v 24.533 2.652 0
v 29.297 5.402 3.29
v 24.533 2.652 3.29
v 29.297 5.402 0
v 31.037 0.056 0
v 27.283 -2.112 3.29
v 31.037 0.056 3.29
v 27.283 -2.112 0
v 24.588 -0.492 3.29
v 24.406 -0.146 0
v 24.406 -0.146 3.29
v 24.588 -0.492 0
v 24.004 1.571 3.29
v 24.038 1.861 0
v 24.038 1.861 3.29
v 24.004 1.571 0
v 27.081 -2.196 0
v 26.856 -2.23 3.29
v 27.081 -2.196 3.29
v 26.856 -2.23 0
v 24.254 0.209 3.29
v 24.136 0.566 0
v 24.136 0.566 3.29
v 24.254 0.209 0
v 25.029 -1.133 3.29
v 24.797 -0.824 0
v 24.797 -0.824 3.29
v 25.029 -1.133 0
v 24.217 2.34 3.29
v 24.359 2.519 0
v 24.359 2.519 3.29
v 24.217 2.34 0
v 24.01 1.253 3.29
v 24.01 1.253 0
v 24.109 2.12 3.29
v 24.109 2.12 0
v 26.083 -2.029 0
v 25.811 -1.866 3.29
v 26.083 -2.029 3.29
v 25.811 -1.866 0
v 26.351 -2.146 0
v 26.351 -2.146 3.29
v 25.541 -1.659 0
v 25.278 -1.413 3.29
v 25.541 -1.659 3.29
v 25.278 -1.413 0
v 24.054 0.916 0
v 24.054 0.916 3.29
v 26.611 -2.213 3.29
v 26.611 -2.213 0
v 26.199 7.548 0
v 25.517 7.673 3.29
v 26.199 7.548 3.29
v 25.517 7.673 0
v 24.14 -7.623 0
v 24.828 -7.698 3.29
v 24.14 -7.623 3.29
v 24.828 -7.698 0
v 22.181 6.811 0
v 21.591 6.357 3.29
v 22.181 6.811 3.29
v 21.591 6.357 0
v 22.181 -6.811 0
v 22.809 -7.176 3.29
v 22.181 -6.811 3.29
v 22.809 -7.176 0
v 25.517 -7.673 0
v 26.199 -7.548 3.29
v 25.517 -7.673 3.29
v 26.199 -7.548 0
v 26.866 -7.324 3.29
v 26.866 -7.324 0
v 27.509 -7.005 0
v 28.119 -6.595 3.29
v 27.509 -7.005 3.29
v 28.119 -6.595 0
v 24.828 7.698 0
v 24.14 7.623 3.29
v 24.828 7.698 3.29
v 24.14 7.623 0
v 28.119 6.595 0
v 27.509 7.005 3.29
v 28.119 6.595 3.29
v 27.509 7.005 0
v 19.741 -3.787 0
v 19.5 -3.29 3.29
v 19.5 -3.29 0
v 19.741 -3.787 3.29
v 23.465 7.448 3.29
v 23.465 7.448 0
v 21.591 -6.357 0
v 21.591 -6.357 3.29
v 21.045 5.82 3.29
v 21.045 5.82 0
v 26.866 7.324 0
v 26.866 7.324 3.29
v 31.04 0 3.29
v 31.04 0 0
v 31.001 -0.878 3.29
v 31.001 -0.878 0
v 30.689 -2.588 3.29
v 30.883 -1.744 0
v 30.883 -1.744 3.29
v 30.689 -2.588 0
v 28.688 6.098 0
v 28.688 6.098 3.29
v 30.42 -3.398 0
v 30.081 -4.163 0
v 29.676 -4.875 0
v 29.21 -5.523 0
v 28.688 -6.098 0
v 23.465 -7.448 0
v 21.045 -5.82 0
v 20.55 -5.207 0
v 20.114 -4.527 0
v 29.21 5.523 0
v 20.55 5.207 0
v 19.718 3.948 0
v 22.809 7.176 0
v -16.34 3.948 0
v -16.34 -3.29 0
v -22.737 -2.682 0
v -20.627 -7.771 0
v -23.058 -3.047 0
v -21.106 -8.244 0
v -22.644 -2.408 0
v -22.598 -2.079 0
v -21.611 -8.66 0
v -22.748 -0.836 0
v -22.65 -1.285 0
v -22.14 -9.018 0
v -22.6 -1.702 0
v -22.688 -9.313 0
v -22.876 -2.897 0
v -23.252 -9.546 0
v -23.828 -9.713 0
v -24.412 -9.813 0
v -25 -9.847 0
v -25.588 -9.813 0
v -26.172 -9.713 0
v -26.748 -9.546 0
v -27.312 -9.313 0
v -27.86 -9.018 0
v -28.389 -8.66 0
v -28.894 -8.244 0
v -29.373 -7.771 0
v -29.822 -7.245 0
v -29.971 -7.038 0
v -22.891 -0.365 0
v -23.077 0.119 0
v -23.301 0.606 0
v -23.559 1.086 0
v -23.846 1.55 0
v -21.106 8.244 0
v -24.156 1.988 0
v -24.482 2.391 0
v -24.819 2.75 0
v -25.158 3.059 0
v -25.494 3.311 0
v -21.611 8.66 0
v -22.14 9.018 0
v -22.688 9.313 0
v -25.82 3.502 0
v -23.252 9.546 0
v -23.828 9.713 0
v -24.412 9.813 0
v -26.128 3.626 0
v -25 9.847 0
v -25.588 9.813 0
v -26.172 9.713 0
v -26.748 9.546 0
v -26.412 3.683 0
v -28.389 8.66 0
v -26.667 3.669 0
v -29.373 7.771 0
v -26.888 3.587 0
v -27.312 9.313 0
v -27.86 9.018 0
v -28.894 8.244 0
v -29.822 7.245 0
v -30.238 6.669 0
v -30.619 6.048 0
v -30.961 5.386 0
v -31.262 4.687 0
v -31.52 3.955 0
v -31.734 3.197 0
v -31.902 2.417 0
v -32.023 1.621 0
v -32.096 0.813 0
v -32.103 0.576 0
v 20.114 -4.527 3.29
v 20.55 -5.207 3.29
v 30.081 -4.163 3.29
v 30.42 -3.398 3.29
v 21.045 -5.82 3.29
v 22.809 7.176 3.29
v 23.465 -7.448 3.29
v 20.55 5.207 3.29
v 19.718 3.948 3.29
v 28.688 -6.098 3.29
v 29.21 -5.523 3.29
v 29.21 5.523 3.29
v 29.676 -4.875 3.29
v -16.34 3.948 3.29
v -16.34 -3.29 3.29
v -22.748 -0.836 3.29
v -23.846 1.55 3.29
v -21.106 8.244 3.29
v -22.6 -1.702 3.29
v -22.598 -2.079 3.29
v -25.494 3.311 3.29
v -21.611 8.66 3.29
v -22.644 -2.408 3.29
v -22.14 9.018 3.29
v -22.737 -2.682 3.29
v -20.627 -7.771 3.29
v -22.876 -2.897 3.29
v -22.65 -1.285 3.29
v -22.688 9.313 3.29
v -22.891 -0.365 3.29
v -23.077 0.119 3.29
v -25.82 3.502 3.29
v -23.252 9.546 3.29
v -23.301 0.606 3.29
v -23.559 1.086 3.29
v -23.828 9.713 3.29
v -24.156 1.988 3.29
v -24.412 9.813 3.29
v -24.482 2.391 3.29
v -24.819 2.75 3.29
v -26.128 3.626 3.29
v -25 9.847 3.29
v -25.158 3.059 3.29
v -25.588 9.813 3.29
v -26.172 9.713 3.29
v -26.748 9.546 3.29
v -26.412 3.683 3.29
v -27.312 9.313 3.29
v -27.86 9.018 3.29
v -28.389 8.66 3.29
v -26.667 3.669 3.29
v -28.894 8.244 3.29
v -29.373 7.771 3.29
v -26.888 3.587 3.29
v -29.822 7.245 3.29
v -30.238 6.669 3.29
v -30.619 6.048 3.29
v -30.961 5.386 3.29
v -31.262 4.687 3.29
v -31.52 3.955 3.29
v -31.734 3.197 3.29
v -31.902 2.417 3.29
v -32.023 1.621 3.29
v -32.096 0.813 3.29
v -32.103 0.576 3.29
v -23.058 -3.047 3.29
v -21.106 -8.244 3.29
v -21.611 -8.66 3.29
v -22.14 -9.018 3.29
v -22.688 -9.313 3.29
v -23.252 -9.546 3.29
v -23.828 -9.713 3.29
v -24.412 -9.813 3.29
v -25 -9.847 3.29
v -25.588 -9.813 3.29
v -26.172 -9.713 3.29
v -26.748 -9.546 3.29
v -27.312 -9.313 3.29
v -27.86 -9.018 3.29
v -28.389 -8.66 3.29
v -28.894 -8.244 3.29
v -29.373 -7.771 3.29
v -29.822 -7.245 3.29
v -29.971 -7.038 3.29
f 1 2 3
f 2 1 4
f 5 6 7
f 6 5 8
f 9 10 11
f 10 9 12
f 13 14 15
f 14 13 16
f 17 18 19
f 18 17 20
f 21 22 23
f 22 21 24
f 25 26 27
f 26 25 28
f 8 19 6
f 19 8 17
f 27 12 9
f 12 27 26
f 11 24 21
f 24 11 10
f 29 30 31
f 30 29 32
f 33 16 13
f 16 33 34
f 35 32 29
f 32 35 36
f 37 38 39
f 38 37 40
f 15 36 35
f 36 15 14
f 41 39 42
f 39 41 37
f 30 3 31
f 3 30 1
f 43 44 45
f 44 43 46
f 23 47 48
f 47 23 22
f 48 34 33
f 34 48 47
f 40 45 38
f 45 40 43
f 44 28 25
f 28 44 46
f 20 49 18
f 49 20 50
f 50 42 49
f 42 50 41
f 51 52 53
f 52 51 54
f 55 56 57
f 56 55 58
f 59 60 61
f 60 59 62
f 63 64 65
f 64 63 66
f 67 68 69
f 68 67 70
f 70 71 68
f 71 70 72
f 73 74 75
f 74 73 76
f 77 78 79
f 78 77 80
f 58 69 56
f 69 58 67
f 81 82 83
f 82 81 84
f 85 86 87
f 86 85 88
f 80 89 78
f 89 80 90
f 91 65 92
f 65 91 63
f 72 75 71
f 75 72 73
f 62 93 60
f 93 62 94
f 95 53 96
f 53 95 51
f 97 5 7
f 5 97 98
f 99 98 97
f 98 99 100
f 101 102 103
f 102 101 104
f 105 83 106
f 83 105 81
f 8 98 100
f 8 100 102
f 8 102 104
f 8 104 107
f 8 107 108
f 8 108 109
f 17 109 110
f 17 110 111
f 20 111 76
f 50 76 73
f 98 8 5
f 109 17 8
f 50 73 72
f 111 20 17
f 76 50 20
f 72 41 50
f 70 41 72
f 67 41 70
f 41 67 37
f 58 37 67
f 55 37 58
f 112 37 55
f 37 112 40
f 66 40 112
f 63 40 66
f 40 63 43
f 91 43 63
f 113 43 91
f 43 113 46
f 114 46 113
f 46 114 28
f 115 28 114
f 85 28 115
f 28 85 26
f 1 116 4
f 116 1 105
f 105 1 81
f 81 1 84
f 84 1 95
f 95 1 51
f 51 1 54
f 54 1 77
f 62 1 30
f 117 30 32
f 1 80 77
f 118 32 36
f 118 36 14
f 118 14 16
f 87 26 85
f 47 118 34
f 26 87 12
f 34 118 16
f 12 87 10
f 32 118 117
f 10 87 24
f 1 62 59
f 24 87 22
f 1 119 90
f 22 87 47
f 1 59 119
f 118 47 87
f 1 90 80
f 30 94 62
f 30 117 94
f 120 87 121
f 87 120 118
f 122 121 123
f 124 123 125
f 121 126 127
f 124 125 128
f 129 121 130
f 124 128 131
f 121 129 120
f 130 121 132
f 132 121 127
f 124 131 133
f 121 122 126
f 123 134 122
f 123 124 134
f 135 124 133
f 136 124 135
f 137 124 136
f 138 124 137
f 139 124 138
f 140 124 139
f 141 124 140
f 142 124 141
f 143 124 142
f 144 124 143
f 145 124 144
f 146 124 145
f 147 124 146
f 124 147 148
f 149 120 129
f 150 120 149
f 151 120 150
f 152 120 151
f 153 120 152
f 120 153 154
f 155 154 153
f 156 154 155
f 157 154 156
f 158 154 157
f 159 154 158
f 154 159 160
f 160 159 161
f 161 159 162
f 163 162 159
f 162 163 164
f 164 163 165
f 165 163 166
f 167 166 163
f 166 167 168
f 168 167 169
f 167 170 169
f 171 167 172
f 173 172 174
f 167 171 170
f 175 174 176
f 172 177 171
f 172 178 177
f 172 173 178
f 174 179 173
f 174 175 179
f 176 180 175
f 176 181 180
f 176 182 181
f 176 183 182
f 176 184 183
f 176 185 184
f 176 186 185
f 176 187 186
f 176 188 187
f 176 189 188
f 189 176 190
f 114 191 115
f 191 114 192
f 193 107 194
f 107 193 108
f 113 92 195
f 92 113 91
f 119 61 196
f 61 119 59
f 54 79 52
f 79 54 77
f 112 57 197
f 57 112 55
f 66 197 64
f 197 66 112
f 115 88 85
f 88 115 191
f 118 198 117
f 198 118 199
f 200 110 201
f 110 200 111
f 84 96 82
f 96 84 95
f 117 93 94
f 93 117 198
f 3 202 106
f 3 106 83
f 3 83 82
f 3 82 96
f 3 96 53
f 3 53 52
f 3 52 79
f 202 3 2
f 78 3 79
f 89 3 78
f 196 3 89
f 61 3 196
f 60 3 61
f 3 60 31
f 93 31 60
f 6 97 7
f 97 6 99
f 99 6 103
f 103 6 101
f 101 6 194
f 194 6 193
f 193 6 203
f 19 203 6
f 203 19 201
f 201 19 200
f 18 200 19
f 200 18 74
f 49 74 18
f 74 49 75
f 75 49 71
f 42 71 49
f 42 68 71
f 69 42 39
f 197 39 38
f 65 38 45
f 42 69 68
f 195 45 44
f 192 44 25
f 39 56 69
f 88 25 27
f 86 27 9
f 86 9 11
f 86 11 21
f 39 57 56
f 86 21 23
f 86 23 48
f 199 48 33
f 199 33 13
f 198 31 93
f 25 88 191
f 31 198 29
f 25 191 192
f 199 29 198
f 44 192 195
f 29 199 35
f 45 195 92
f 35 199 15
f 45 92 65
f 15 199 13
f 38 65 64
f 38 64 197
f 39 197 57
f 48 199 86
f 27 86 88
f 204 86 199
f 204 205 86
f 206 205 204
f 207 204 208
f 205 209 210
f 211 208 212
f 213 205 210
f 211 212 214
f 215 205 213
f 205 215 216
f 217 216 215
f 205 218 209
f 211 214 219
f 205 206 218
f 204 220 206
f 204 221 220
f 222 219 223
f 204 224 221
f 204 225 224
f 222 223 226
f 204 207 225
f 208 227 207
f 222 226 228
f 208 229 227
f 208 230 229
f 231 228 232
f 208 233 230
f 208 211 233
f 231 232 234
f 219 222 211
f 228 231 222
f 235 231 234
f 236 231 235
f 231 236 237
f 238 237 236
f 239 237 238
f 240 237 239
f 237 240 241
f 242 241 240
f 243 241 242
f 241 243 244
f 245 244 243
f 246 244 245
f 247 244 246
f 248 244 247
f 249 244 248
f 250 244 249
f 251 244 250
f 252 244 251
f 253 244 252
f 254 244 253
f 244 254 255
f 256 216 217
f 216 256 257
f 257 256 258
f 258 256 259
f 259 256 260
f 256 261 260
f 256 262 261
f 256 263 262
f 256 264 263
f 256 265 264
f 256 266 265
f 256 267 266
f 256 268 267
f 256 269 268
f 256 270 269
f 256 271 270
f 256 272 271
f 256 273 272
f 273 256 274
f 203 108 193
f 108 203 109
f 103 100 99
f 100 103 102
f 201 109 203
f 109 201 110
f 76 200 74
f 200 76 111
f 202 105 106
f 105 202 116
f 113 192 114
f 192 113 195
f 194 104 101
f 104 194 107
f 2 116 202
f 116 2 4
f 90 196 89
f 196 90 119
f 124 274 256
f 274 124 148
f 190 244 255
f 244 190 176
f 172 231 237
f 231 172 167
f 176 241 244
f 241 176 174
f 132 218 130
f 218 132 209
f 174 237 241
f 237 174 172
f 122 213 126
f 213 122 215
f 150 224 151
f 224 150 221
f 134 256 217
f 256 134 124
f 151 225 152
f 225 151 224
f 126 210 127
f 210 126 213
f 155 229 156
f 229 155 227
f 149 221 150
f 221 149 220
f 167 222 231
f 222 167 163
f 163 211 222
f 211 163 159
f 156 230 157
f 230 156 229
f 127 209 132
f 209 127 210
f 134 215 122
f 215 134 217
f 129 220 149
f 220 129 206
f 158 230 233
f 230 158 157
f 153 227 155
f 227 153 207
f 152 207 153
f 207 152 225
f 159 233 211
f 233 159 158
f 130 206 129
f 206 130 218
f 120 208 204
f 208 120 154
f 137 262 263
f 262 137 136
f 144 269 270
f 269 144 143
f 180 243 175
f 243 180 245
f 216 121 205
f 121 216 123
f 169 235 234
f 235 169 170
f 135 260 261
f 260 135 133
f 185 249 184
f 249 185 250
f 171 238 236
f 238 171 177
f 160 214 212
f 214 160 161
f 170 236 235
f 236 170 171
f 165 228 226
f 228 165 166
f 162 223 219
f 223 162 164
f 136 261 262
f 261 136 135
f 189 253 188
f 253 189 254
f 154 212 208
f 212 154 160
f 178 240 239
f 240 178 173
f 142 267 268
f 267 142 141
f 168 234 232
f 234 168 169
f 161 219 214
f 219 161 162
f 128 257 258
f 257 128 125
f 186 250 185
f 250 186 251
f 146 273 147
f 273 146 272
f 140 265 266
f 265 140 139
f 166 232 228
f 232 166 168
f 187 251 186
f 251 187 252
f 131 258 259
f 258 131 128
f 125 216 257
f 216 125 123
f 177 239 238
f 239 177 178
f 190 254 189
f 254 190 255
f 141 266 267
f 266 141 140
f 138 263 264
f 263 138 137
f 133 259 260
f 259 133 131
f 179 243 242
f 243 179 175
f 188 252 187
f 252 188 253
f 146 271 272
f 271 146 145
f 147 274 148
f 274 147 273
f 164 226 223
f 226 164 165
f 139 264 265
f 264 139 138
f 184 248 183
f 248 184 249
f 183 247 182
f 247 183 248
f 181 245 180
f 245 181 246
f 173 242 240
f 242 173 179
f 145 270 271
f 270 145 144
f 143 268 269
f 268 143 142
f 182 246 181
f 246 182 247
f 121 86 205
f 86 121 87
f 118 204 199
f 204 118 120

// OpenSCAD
//Specify the distance between the centers of the inserts
wrench_length = 50;

//The size of the insert on the right side
insert_size_a = 5.5;

//The size of the insert on the left side
insert_size_b = 7.66;

// preview[view:south, tilt:top]

/* [hidden] */
wrench_thickness = (insert_size_a + insert_size_b) / 4;
offset = wrench_thickness;

module insert(insert)
{
    /*
    linear_extrude(height=10,convexity=10)
    polygon(points=[[-insert/2,0],[0,insert/2],[insert+wrench_thickness,insert/2],[insert+wrench_thickness,-insert/2],[0,-insert/2]]);
    */
    
    union()
    {
        translate([-insert/2,-insert/2,0])
        cube([insert + wrench_thickness,insert,wrench_thickness+1]);
        
        translate([-insert/2,0,0])
        scale([1.25 + insert/20,insert/2,1])
        cylinder(r=1,h=wrench_thickness+1,$fn=44);
    }
}

difference()
{
    hull()
    {
        translate([wrench_length/2,0,0])
        scale([1,1 + insert_size_a/20,1])
        cylinder(r=insert_size_a/2 + wrench_thickness,h=wrench_thickness,$fn=insert_size_a*10);

        translate([wrench_length/2 - insert_size_a,-(insert_size_a + insert_size_b)/4,0])
        cube([1,(insert_size_a*1.05 + insert_size_b*1.05)/2,wrench_thickness]);
    }

    translate([wrench_length/2 + offset,offset/2,-0.5])
    rotate([0,0,30])
    {
        insert(insert_size_a);
    }
}

difference()
{
    hull()
    {
        translate([-wrench_length/2,0,0])
        scale([1,1 + insert_size_b/20,1])
        cylinder(r=insert_size_b/2 + wrench_thickness,h=wrench_thickness,$fn=insert_size_b*10);

        translate([-(wrench_length/2 - insert_size_b),-(insert_size_a + insert_size_b)/4,0])
        cube([1,(insert_size_a*1.1 + insert_size_b*1.1)/2,wrench_thickness]);
    }
    
    translate([-wrench_length/2 - offset, -offset/2,-0.5])
    rotate([0,0,30 + 180])
    {
        insert(insert_size_b);
    }
}

hull()
{
    translate([wrench_length/2 - insert_size_a,-(insert_size_a + insert_size_b)/4,0])
    cube([1,(insert_size_a*1.1 + insert_size_b*1.1)/2,wrench_thickness]);

    translate([-(wrench_length/2 - insert_size_b),-(insert_size_a + insert_size_b)/4,0])
    cube([1,(insert_size_a*1.1 + insert_size_b*1.1)/2,wrench_thickness]);
}
